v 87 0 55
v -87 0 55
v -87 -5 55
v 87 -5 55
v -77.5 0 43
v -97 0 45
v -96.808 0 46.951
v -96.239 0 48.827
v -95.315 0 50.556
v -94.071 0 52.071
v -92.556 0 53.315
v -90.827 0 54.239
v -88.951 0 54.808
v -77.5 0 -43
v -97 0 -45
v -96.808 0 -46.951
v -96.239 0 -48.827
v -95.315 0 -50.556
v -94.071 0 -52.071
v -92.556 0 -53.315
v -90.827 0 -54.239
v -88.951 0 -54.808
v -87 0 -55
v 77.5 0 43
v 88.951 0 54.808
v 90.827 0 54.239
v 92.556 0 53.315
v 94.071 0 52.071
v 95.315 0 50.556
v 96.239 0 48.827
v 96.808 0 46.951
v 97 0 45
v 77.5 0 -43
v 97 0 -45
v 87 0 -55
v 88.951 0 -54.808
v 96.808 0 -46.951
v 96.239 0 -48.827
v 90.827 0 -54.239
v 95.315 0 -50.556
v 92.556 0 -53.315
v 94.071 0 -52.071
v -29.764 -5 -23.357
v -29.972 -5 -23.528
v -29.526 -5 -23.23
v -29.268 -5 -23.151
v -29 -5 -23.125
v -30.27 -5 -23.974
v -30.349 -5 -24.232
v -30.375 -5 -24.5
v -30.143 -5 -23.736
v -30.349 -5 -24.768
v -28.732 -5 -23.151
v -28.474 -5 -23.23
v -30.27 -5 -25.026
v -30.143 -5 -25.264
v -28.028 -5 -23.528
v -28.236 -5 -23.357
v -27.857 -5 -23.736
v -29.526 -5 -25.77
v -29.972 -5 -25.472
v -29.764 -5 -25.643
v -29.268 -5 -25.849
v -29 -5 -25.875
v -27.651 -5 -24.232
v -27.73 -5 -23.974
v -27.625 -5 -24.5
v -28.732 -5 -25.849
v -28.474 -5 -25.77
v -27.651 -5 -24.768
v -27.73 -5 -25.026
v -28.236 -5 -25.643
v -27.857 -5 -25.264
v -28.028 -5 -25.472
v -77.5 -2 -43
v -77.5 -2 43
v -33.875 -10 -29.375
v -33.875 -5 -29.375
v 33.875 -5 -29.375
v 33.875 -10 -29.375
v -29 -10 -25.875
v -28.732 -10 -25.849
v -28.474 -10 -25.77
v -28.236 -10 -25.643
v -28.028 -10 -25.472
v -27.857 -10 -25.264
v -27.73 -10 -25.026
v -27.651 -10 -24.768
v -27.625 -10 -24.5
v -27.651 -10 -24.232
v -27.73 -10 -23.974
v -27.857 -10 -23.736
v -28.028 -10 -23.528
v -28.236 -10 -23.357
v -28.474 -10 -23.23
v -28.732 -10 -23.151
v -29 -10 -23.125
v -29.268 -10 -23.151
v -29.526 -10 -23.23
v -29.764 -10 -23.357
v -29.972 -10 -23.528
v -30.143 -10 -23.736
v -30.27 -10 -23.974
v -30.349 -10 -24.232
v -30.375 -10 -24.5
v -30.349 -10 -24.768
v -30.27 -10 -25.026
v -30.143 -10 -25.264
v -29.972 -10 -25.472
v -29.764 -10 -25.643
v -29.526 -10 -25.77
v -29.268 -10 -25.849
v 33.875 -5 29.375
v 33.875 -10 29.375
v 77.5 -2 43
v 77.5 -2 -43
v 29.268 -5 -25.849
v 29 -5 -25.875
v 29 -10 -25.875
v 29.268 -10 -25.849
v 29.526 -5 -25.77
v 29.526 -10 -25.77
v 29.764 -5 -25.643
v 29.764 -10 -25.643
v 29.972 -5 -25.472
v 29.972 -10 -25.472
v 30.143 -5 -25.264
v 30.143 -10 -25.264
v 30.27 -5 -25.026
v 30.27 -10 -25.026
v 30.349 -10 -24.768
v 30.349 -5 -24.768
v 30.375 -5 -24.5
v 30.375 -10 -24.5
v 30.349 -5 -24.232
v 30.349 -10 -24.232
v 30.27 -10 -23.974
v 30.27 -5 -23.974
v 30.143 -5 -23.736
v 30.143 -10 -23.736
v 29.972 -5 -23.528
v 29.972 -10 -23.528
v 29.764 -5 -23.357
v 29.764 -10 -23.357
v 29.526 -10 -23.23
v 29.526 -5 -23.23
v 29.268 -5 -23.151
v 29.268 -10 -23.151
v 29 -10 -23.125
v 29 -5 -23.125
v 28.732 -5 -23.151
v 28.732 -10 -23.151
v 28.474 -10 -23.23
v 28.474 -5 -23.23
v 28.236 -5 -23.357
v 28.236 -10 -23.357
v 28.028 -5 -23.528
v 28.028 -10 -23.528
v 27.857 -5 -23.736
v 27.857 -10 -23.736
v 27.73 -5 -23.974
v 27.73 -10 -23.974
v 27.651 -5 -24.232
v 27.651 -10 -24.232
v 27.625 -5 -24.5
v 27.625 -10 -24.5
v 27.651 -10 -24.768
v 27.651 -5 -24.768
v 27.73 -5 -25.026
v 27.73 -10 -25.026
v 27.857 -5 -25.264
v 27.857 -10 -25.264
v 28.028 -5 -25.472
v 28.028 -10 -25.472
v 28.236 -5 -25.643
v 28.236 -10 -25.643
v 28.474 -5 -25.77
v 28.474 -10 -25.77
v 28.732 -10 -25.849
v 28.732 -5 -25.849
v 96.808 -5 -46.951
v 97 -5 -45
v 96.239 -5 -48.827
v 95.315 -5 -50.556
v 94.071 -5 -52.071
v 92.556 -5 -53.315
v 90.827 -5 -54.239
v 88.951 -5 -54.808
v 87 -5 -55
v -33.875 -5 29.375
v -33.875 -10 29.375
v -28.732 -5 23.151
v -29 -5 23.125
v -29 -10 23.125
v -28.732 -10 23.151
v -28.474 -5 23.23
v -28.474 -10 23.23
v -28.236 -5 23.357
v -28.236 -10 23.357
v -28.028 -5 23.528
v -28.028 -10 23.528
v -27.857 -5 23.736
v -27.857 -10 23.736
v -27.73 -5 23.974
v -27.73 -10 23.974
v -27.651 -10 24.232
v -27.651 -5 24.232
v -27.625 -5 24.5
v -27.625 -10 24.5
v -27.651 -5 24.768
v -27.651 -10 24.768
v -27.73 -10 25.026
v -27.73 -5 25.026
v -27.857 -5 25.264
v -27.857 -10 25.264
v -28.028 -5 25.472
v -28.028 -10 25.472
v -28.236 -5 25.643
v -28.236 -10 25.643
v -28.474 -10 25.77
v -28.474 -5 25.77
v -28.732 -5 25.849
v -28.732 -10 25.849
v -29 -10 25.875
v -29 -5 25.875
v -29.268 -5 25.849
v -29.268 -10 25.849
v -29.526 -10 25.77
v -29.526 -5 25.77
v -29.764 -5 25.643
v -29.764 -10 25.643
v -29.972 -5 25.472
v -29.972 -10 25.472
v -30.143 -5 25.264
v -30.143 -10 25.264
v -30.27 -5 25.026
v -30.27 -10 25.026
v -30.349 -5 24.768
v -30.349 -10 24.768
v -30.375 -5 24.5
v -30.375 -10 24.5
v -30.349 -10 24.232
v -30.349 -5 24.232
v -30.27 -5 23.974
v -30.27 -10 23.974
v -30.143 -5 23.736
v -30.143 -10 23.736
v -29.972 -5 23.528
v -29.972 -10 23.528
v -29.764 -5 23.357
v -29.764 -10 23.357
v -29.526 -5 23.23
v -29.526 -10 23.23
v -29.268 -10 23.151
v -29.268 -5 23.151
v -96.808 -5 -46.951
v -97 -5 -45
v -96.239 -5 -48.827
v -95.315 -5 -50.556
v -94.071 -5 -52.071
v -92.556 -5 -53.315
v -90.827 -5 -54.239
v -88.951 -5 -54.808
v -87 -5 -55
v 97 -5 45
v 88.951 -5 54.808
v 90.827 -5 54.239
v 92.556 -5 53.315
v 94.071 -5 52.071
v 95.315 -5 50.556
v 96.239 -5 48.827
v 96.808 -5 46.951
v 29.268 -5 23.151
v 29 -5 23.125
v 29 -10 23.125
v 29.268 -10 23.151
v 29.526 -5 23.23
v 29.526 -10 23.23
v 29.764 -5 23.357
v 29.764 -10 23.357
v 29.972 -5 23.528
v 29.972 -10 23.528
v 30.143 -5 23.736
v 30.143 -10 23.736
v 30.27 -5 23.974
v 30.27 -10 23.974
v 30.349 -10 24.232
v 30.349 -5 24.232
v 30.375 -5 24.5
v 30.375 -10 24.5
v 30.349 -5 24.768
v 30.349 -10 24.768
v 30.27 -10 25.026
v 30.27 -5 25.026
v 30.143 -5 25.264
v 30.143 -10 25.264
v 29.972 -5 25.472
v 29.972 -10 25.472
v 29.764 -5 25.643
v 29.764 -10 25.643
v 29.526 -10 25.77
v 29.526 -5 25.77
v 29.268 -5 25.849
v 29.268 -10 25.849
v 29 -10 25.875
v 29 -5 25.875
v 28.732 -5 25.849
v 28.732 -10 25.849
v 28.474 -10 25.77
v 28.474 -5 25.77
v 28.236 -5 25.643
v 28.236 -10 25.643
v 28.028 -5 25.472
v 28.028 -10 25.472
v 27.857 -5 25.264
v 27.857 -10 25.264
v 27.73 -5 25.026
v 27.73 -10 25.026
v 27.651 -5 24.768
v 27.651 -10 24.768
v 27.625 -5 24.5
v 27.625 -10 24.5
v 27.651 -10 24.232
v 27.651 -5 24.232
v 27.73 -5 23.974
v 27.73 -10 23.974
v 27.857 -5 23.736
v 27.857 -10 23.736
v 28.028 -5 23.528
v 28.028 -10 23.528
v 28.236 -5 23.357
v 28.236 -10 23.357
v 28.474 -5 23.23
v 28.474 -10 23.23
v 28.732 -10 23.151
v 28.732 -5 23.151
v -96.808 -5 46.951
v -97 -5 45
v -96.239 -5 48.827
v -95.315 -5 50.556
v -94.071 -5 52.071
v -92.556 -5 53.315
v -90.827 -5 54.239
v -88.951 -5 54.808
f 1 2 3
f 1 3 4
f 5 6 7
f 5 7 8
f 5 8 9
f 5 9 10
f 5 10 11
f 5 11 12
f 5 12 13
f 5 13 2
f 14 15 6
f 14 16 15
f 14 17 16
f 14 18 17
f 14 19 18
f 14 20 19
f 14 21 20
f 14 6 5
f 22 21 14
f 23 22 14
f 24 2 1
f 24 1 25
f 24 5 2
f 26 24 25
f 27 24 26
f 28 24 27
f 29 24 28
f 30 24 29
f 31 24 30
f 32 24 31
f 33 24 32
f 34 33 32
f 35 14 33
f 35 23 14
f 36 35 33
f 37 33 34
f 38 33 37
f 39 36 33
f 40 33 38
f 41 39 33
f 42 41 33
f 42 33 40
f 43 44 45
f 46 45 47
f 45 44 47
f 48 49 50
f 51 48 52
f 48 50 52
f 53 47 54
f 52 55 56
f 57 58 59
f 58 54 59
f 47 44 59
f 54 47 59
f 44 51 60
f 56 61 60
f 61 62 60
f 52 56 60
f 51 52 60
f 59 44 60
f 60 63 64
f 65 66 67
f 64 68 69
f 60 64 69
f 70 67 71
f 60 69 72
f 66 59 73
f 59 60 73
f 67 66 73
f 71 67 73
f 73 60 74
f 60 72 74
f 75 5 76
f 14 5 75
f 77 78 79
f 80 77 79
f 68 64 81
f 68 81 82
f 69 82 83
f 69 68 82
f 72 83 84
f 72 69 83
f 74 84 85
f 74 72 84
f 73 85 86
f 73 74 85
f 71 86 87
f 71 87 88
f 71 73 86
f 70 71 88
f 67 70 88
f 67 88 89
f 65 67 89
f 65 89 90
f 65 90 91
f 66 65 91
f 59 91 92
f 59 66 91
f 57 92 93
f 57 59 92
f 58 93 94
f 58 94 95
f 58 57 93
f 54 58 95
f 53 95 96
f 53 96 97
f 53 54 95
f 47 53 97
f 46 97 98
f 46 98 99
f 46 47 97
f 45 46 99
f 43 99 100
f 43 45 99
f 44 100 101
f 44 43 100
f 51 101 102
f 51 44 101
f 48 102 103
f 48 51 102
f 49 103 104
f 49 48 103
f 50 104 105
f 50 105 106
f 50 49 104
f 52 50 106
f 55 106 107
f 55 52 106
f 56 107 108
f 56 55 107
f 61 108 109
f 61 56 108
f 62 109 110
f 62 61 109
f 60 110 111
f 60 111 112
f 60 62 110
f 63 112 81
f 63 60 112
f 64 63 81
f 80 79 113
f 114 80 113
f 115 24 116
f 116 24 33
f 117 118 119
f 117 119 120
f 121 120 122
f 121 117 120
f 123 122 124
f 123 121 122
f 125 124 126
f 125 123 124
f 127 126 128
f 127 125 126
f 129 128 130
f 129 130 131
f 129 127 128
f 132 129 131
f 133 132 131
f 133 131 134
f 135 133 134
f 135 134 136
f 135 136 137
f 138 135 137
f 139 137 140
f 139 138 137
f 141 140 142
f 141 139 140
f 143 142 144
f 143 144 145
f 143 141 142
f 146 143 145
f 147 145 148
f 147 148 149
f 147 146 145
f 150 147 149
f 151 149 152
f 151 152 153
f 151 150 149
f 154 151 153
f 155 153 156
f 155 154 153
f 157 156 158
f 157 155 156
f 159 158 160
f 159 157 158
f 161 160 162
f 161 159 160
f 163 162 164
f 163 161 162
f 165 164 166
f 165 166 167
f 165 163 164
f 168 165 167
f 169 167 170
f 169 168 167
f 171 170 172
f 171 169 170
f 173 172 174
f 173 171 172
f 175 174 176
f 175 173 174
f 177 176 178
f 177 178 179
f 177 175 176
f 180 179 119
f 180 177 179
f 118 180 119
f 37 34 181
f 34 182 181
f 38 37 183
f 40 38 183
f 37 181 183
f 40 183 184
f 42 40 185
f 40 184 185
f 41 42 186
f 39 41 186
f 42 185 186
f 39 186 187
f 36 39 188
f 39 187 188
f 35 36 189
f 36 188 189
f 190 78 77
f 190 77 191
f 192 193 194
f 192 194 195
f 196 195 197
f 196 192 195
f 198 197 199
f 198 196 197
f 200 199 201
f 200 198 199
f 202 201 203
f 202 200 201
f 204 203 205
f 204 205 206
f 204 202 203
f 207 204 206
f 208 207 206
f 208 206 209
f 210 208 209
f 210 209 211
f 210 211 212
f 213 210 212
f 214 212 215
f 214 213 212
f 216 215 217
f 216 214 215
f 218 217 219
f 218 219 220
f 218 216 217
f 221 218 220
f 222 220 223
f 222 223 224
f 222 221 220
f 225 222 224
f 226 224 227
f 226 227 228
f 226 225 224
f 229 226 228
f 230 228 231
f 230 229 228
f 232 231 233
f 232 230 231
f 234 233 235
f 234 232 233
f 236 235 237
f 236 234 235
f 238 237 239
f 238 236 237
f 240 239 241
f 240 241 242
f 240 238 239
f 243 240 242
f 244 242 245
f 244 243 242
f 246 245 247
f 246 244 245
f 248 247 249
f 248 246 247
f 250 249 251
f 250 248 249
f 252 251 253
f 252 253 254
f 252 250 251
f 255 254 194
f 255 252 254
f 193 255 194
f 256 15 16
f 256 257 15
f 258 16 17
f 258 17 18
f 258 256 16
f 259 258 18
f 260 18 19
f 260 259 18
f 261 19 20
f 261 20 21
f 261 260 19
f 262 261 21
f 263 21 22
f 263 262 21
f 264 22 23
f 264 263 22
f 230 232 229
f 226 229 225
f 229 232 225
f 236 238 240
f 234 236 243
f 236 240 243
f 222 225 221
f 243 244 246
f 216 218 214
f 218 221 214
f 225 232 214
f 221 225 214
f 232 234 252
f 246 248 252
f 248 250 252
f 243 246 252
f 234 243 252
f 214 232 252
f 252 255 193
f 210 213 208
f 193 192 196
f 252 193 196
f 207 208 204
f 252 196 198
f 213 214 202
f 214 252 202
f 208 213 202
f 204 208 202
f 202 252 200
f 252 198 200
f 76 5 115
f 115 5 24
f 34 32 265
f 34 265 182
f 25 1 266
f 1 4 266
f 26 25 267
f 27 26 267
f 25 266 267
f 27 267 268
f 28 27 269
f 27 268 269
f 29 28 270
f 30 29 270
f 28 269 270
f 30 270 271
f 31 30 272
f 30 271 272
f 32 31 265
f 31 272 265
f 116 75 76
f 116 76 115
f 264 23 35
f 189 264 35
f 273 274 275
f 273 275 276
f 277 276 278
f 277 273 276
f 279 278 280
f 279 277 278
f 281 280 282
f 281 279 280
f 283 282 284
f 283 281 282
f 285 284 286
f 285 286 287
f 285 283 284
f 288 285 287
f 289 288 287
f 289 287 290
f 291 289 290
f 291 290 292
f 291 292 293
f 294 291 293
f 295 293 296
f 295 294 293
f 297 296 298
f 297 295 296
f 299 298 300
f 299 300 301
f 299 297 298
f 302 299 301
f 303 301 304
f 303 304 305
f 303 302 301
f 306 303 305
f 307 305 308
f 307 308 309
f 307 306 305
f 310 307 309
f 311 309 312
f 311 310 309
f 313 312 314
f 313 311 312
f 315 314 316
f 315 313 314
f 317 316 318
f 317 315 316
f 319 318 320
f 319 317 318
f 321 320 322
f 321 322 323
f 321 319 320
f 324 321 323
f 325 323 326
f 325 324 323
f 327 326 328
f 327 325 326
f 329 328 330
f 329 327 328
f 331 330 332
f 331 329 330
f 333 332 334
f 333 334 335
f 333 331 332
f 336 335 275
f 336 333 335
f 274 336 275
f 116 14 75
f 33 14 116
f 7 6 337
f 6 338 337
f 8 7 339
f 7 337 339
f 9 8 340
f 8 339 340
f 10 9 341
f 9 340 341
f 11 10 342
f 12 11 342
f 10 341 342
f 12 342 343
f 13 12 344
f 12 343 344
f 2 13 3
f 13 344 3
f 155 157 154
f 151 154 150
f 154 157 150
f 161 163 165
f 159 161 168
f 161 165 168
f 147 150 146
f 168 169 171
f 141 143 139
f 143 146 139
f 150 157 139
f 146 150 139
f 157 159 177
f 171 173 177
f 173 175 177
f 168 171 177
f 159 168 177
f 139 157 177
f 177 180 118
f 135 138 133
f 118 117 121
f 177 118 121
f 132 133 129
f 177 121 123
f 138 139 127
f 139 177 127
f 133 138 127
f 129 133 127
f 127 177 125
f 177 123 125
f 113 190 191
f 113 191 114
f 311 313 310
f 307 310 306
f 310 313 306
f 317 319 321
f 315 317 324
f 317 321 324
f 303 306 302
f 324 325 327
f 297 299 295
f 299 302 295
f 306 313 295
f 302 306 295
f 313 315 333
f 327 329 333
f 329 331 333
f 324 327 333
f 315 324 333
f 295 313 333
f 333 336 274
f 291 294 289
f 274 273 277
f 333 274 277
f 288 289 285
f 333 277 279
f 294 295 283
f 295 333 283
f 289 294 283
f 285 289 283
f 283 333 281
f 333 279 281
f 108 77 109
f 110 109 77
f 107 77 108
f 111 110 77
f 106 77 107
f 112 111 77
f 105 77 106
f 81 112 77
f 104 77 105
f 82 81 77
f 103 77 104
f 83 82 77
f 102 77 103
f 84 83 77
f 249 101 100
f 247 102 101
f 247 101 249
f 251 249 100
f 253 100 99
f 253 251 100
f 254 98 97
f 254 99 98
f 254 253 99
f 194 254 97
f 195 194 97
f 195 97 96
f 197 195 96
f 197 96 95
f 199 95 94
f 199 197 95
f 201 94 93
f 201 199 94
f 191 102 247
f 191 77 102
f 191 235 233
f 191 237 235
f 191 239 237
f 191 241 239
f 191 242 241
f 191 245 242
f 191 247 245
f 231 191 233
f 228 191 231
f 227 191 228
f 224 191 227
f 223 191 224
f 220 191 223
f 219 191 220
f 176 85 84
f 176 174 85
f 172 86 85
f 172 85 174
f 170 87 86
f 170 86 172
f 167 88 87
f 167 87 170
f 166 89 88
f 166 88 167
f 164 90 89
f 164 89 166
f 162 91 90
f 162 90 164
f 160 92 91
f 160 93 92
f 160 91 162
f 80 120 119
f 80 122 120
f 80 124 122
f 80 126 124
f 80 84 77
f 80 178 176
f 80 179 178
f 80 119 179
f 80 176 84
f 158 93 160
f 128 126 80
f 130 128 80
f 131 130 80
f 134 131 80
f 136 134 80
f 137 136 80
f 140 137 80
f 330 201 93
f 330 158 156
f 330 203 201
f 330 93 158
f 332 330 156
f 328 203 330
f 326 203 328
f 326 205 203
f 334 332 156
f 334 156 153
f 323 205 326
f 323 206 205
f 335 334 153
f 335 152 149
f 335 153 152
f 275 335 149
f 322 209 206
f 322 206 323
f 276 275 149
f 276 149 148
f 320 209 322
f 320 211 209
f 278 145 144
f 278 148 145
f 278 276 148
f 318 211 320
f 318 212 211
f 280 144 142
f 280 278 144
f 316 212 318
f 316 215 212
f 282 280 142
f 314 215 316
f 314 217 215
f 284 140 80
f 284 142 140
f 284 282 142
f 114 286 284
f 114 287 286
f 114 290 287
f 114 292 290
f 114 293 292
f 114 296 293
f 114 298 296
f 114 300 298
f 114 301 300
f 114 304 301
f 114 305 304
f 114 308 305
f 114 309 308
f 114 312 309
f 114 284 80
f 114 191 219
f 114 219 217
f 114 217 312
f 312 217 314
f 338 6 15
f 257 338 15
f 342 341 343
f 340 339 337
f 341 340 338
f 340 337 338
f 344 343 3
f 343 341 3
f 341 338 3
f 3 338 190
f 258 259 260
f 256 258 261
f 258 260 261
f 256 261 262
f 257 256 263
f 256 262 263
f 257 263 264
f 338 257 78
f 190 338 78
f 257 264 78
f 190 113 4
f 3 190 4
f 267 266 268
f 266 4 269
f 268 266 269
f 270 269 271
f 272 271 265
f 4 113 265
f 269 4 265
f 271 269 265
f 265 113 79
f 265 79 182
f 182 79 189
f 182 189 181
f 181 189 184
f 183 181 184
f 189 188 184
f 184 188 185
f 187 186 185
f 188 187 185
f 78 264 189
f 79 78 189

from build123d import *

# Parameters (mm, degrees)
SKETCH1_W           = 194
SKETCH1_H           = 110
BOSS_EXTRUDE1_DEPTH = 5
FILLET1_R           = 10
SKETCH2_W           = 155
SKETCH2_H           = 86
CUT_EXTRUDE1_DEPTH  = 2
SKETCH3_W           = 67.75
SKETCH3_H           = 58.75
SKETCH3_R           = 1.375
BOSS_EXTRUDE2_DEPTH = 5


with BuildPart() as part:
    # Sketch1 → Boss-Extrude1 (new body)
    with BuildSketch(Plane(origin=(0, 0, 0), x_dir=(1, 0, 0), z_dir=(0, 1, 0))):
        Rectangle(SKETCH1_W, SKETCH1_H)
    extrude(amount=-BOSS_EXTRUDE1_DEPTH)

    # Fillet1
    fillet1_edges = [part.edges().sort_by_distance(p)[0] for p in [
        (97, -2.5, 55),
        (-97, -2.5, 55),
        (-97, -2.5, -55),
        (97, -2.5, -55),
    ]]
    fillet(fillet1_edges, radius=FILLET1_R)

    # Sketch2 → Cut-Extrude1 (cut)
    with BuildSketch(Plane(origin=(0, 0, 0), x_dir=(1, 0, 0), z_dir=(0, 1, 0))):
        Rectangle(SKETCH2_W, SKETCH2_H)
    extrude(amount=-CUT_EXTRUDE1_DEPTH, mode=Mode.SUBTRACT)

    # Sketch3 → Boss-Extrude2 (add)
    with BuildSketch(Plane.XZ.offset(5)):
        Rectangle(SKETCH3_W, SKETCH3_H)
        with Locations(Location((-29, 24.5, 0), (0, 0, 270))):
            Circle(SKETCH3_R, mode=Mode.SUBTRACT)
        with Locations(Location((29, 24.5, 0), (0, 0, 270))):
            Circle(SKETCH3_R, mode=Mode.SUBTRACT)
        with Locations(Location((29, -24.5, 0), (0, 0, 270))):
            Circle(SKETCH3_R, mode=Mode.SUBTRACT)
        with Locations(Location((-29, -24.5, 0), (0, 0, 270))):
            Circle(SKETCH3_R, mode=Mode.SUBTRACT)
    extrude(amount=BOSS_EXTRUDE2_DEPTH)


solid = part.part
